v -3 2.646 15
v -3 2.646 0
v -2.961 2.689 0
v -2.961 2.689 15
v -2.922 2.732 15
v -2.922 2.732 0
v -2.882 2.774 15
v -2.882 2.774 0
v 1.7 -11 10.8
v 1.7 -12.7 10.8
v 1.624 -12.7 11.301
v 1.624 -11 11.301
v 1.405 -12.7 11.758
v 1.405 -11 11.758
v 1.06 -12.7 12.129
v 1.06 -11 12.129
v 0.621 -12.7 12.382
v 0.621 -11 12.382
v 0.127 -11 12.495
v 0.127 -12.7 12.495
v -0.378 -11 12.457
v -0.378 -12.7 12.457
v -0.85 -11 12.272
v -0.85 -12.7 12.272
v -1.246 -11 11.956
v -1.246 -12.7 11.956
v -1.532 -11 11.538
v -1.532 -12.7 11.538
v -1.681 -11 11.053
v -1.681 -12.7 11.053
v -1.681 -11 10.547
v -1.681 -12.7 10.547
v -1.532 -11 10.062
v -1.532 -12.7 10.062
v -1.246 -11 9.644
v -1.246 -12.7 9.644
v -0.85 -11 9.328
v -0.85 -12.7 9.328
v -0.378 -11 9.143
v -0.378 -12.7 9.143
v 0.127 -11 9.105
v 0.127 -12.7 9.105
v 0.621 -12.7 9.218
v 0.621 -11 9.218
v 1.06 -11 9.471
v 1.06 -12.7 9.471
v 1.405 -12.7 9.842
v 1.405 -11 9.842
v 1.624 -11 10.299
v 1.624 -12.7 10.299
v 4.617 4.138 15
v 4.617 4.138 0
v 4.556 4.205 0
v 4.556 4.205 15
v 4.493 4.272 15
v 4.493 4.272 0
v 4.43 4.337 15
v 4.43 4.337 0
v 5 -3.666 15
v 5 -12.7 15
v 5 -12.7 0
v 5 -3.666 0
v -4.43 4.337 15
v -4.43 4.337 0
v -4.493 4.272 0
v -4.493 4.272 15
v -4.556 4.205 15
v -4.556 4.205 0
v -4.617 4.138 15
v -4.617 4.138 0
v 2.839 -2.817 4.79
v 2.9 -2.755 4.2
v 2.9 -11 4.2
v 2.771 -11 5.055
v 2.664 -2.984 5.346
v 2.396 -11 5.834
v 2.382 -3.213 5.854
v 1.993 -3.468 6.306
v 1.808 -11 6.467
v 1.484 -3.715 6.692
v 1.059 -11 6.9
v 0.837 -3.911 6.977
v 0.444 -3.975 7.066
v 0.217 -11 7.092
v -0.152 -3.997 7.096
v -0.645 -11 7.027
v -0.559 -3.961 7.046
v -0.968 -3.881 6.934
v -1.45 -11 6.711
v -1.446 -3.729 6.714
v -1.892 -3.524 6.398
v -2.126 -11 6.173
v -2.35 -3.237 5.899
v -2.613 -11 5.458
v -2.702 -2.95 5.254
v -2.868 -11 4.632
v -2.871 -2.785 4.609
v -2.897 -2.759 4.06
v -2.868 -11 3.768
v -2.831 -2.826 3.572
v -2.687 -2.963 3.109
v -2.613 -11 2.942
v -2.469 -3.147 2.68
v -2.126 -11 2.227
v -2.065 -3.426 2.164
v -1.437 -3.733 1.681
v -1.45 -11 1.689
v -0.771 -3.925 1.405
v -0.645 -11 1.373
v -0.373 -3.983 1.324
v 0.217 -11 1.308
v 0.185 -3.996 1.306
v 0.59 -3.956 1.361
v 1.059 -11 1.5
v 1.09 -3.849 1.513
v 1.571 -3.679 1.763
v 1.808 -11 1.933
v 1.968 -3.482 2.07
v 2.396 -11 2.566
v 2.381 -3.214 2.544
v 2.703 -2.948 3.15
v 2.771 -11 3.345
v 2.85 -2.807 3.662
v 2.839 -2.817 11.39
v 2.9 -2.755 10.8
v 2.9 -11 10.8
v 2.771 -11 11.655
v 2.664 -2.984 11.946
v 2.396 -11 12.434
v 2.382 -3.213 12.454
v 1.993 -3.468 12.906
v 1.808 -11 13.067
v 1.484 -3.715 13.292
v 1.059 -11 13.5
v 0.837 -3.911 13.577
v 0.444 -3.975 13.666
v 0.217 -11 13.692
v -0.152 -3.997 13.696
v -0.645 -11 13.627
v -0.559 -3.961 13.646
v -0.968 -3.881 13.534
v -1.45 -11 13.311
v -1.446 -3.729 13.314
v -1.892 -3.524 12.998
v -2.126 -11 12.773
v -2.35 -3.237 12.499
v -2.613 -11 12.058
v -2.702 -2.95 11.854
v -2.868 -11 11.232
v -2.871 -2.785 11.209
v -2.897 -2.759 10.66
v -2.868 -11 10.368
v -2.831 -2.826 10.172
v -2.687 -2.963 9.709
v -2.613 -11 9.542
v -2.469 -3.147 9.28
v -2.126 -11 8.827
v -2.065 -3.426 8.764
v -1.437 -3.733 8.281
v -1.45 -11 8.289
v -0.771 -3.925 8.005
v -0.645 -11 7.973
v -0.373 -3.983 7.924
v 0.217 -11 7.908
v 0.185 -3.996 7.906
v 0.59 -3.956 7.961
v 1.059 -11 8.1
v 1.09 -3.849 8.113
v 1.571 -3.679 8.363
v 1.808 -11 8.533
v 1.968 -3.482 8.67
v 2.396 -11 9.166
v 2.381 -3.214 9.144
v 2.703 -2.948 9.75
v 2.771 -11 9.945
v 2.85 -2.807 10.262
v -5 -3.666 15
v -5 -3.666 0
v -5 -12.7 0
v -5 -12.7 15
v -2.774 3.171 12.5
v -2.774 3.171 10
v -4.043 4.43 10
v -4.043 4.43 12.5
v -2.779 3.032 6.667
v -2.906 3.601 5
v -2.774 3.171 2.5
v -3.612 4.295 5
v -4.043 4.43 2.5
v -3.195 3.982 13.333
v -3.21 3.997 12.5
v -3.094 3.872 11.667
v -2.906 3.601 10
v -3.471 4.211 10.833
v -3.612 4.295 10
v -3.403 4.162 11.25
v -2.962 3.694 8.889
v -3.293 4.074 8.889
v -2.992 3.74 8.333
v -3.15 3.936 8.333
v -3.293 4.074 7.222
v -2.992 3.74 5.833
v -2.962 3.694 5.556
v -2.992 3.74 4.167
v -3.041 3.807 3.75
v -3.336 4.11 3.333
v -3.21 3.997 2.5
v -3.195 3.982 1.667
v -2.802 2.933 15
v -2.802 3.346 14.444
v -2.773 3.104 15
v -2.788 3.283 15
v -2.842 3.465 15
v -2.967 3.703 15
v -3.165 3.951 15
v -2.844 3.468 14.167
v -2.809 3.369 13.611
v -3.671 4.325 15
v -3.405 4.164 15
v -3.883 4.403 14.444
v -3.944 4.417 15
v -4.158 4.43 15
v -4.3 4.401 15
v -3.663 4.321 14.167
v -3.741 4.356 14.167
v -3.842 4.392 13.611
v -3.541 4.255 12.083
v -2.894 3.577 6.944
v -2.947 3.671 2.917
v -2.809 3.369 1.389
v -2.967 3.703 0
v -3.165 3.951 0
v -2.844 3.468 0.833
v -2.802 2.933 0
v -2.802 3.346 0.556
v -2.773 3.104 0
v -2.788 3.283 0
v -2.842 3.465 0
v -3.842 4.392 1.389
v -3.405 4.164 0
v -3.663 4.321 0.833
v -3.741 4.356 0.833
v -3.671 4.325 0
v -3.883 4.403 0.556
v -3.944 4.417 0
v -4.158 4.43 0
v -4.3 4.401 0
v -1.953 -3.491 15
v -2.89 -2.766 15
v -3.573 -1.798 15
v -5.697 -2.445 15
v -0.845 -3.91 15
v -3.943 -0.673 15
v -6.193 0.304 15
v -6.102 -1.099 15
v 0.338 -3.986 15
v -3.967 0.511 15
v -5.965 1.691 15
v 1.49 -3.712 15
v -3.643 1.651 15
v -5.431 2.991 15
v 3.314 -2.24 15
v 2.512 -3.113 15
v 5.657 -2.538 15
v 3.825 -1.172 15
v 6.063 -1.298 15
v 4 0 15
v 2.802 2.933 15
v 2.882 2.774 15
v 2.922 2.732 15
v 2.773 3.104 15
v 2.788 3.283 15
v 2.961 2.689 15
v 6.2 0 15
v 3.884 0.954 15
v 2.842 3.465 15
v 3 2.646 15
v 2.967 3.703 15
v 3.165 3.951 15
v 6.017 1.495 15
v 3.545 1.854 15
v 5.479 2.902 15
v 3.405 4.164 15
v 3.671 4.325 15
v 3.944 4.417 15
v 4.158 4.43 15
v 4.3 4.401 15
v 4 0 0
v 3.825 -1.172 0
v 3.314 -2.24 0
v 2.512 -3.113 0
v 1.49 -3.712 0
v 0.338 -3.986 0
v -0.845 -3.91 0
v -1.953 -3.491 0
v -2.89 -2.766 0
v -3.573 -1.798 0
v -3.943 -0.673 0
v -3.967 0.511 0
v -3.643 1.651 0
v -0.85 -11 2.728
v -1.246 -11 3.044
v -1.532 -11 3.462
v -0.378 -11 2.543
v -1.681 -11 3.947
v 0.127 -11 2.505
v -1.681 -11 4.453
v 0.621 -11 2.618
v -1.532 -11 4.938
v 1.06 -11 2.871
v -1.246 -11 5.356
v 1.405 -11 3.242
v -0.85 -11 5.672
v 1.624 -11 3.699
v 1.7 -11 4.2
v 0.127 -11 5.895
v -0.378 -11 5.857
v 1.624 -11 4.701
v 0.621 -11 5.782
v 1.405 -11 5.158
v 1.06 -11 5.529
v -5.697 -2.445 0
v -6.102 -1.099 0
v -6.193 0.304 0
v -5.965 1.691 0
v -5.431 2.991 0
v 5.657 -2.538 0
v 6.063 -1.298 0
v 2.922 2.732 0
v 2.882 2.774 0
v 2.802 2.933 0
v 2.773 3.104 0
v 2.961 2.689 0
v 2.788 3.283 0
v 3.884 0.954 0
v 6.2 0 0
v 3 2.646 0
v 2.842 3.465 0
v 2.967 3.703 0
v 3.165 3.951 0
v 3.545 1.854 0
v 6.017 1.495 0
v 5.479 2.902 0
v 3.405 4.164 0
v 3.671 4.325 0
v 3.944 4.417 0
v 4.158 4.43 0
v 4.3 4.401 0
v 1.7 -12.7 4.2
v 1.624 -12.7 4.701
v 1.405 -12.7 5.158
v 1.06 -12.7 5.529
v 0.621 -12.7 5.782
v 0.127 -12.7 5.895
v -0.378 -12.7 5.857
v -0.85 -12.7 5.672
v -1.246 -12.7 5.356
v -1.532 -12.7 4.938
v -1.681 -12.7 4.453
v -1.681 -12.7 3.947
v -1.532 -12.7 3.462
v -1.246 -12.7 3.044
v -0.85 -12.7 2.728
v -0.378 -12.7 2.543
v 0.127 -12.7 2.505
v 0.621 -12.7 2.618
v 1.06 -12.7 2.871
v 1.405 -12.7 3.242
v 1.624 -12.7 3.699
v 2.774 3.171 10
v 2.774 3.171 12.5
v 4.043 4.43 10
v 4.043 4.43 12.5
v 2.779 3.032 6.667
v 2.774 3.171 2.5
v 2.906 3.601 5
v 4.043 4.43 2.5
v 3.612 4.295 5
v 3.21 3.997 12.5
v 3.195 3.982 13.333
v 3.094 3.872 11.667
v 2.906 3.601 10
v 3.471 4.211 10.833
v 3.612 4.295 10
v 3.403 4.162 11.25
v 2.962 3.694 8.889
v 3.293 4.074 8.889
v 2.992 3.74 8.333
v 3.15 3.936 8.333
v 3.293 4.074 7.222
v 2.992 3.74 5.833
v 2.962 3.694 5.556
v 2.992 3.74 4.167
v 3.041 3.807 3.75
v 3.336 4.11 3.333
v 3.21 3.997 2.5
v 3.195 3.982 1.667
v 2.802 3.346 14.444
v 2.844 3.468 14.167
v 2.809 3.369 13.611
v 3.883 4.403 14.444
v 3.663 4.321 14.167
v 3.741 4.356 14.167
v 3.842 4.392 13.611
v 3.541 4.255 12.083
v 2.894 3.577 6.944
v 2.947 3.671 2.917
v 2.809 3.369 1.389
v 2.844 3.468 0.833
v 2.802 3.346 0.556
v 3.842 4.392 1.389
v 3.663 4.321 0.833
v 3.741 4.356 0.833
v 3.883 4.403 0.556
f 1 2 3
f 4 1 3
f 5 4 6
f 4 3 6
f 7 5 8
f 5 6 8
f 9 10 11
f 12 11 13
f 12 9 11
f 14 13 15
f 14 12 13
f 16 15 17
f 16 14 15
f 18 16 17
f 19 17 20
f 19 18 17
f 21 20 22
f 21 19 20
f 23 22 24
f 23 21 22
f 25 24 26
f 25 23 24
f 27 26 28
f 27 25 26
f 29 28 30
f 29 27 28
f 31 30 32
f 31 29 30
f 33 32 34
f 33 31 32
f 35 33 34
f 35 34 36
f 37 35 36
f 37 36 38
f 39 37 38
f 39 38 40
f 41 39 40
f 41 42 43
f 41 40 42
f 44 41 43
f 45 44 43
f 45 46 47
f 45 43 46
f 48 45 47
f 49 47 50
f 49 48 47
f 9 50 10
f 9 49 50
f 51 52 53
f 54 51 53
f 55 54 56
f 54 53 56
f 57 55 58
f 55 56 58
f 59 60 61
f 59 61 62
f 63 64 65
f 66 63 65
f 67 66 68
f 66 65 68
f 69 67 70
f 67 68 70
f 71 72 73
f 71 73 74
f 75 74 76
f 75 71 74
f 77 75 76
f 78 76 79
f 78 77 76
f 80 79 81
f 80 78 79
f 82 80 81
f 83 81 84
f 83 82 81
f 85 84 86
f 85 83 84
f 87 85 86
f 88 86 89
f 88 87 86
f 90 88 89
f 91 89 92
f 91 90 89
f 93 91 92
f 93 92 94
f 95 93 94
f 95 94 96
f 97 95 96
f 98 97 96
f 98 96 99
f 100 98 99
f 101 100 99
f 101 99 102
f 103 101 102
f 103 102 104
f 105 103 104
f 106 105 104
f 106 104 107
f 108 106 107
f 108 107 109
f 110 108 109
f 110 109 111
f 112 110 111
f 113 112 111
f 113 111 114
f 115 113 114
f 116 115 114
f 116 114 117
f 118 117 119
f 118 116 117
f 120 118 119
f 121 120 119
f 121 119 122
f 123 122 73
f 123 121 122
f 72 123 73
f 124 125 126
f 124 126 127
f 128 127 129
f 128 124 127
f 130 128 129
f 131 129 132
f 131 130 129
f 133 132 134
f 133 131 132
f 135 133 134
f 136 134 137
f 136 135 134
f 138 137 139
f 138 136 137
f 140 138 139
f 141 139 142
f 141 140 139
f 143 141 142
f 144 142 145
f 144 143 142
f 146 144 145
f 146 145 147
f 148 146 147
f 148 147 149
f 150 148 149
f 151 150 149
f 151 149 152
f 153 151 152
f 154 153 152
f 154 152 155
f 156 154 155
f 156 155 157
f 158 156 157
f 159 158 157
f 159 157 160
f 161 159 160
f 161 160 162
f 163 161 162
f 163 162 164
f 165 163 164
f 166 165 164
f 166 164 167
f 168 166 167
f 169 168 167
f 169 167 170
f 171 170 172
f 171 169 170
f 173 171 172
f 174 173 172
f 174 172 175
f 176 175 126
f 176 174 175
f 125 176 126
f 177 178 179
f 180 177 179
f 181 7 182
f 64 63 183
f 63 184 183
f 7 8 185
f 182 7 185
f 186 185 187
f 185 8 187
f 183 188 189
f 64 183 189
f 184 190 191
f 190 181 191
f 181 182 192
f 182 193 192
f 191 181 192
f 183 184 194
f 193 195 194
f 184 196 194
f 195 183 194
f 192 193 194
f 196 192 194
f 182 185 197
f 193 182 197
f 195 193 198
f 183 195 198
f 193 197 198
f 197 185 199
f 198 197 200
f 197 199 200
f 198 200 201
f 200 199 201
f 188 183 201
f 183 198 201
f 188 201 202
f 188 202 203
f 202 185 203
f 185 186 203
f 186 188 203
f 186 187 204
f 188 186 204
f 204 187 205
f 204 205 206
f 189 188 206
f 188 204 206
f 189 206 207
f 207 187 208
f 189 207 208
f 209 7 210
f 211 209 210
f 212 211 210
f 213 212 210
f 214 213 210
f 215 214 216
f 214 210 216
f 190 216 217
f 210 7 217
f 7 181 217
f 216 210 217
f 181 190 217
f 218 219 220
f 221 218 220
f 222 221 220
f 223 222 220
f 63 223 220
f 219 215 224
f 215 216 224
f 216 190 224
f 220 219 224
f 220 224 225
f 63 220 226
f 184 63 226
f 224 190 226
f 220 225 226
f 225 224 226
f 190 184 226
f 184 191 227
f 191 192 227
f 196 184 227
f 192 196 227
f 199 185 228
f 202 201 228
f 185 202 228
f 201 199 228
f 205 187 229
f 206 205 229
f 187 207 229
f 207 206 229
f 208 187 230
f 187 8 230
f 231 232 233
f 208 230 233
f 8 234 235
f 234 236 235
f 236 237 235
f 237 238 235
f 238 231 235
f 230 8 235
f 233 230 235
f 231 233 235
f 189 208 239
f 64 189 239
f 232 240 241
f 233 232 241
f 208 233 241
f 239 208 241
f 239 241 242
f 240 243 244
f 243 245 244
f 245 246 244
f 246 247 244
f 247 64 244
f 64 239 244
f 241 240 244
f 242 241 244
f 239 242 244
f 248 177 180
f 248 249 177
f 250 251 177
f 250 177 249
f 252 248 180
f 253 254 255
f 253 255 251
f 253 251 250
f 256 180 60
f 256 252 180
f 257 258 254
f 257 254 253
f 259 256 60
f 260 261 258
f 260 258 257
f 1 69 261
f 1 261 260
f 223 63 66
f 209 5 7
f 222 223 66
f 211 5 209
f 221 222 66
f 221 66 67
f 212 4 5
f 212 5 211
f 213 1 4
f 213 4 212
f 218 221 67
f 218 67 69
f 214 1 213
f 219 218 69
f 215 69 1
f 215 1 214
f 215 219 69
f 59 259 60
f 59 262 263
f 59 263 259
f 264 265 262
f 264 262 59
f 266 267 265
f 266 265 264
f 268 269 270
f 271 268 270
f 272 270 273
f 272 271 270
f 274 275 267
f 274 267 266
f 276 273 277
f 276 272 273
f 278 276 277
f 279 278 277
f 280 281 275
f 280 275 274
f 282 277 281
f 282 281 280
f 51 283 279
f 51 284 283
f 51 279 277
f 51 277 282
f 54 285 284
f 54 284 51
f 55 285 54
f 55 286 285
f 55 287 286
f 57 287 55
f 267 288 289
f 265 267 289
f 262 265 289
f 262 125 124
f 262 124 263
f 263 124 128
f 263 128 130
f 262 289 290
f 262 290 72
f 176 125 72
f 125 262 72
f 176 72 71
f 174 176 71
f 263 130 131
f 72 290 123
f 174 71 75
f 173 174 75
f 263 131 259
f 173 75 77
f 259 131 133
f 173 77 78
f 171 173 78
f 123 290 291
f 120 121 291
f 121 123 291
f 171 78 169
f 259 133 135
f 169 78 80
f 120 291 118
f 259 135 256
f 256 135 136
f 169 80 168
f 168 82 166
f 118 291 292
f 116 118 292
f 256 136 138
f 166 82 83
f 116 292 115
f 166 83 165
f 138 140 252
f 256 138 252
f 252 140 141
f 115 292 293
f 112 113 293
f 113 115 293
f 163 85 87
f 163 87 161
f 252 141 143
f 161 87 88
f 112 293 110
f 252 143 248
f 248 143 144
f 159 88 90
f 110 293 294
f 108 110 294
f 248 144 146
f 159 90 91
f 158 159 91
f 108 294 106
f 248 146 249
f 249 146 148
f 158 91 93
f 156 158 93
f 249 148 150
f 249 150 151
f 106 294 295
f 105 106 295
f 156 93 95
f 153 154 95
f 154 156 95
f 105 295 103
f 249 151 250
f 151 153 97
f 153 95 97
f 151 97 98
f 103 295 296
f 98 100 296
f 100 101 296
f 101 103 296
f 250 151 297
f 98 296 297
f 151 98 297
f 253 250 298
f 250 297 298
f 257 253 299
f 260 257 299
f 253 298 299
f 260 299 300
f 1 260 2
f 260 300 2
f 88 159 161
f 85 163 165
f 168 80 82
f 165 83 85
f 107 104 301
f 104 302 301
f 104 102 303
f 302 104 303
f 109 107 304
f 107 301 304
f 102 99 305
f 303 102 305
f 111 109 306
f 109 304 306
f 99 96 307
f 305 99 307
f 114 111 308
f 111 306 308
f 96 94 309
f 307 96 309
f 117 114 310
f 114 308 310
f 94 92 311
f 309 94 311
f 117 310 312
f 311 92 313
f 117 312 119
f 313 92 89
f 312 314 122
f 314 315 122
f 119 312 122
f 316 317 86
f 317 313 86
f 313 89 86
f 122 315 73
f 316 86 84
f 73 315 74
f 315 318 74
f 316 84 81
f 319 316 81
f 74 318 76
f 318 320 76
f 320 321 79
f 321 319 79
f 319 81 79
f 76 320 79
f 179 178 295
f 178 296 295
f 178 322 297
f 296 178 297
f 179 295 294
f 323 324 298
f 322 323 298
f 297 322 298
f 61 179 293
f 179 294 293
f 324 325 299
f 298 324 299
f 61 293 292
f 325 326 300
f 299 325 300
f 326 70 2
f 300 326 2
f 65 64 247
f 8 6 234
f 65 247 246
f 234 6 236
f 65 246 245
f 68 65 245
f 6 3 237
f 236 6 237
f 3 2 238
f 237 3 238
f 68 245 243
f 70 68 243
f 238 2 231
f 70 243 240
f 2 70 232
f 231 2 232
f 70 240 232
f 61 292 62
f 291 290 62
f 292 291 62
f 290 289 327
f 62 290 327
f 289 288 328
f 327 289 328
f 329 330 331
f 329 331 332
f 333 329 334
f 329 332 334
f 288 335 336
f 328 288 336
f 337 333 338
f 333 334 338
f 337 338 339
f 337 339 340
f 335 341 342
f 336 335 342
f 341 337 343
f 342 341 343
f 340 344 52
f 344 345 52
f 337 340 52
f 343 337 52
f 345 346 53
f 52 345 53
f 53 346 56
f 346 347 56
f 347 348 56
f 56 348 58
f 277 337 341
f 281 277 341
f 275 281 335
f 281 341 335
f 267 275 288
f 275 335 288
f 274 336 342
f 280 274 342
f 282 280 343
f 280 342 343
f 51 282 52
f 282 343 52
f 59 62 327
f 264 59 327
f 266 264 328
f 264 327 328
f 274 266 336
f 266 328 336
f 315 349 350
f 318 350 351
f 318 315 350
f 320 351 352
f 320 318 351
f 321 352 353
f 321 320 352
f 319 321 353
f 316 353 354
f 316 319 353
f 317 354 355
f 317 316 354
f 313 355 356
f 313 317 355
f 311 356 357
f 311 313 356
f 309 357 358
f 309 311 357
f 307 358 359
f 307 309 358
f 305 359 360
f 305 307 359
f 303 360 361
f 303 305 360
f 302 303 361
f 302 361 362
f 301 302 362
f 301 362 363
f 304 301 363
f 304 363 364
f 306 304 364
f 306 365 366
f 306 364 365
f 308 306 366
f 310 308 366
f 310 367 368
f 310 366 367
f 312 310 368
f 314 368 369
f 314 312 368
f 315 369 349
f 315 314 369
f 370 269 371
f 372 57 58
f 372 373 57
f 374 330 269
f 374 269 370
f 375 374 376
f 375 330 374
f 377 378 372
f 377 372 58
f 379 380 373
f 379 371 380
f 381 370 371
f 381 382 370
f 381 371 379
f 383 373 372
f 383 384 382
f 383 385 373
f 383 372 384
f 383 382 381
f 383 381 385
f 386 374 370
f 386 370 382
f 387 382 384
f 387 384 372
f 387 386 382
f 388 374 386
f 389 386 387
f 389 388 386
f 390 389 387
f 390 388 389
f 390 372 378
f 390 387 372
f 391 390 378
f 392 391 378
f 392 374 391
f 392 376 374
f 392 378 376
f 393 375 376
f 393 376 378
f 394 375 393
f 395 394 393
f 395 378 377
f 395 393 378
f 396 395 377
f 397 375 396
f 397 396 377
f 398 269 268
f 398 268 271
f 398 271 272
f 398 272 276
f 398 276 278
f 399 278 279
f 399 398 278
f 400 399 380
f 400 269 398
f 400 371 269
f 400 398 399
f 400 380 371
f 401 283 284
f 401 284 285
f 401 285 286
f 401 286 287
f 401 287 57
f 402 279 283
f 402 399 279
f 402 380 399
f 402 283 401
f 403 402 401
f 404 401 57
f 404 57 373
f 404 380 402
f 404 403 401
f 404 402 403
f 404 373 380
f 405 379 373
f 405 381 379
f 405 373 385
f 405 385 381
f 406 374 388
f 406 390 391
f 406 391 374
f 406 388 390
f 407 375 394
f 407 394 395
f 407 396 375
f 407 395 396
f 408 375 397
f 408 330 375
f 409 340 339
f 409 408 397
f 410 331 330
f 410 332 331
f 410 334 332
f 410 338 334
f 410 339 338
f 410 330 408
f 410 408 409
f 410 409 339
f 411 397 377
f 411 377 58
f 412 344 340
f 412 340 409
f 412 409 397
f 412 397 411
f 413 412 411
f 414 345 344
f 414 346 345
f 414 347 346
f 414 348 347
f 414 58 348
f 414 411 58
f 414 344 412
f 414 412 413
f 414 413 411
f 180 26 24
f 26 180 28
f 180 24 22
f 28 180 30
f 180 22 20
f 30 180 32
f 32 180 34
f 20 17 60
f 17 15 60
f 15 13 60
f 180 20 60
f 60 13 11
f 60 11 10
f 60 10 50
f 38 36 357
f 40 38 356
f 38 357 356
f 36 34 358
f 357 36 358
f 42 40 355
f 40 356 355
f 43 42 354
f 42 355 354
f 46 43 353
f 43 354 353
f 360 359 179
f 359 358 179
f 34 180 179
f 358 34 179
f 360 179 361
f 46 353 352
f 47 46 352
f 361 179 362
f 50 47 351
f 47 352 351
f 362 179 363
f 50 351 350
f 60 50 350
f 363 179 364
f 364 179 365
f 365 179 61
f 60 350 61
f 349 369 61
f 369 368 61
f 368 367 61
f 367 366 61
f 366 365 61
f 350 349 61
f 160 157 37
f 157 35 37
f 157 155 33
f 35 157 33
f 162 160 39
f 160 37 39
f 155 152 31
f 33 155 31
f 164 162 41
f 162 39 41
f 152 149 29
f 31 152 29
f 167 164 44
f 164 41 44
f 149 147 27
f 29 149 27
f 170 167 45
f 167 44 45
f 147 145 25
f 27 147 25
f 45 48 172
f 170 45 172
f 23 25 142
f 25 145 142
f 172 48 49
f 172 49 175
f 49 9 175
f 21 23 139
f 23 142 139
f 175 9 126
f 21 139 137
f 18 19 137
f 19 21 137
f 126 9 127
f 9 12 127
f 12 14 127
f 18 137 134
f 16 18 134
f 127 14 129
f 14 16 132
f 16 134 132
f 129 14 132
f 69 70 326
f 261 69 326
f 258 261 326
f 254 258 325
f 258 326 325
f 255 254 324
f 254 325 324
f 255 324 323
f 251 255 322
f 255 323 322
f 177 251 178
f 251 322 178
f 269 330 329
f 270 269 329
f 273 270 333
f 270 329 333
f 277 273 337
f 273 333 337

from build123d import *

# Parameters (mm, degrees)
F1_DEPTH = 15
F2_R     = 1.7
F3_DEPTH = 25
F2_R_2   = 2.9
F4_DEPTH = 11


# Not quite as in the source:
# - a feature names something its author has since deleted; it is built from what else it names


with BuildPart() as f1:
    # F0 (on Top) → F1 (new body)
    with BuildSketch(Plane.XY):
        with BuildLine():
            ThreePointArc((3, 2.6457513111), (3.7416573868, 1.4142135624), (4, 0))
            ThreePointArc((4, 0), (-1.4142135624, -3.7416573868), (-3, 2.6457513111))
            ThreePointArc((-3, 2.6457513111), (-2.9417354436, 2.7103860574), (-2.8820786357, 2.7737380442))
            add(Edge.make_bspline(
                [(-2.8820786357, 2.7737380442), (-2.3761359585, 3.4936148761), (-3.7454309361, 4.7943850499), (-4.4301631449, 4.3374709808)],
                knots=[0.118365038, 0.118365038, 0.118365038, 0.118365038, 2.0060809504, 2.0060809504, 2.0060809504, 2.0060809504], degree=3))
            ThreePointArc((-4.4301631449, 4.3374709808), (-4.524697766, 4.2387628061), (-4.6170335889, 4.1379947848))
            ThreePointArc((-4.6170335889, 4.1379947848), (-6.1925482399, 0.3038853354), (-5, -3.666060556))
            ThreePointArc((-5, -3.666060556), (0, -6.2), (5, -3.666060556))
            ThreePointArc((5, -3.666060556), (5.8923679451, -1.9287301522), (6.2, 0))
            ThreePointArc((6.2, 0), (5.7907516028, 2.2152191481), (4.6170335889, 4.1379947848))
            ThreePointArc((4.6170335889, 4.1379947848), (4.524697766, 4.2387628061), (4.4301631449, 4.3374709808))
            add(Edge.make_bspline(
                [(2.8820786357, 2.7737380442), (2.3761359585, 3.4936148761), (3.7454309361, 4.7943850499), (4.4301631449, 4.3374709808)],
                knots=[0.118365038, 0.118365038, 0.118365038, 0.118365038, 2.0060809504, 2.0060809504, 2.0060809504, 2.0060809504], degree=3))
            ThreePointArc((2.8820786357, 2.7737380442), (2.9417354436, 2.7103860574), (3, 2.6457513111))
        make_face()
        with BuildLine():
            ThreePointArc((5, -3.666060556), (0, -6.2), (-5, -3.666060556))
            Line((-5, -3.666060556), (-5, -12.7))
            Line((-5, -12.7), (0, -12.7))
            Line((0, -12.7), (5, -12.7))
            Line((5, -12.7), (5, -3.666060556))
        make_face()
    extrude(amount=F1_DEPTH)

    # F2 (on Front) → F3 (cut)
    with BuildSketch(Plane.XZ):
        with Locations((0, 10.8)):
            Circle(F2_R)
        with Locations((3.5e-09, 4.2)):
            Circle(F2_R)
    extrude(amount=F3_DEPTH, mode=Mode.SUBTRACT)

    # F2 (on Front) → F4 (cut)
    with BuildSketch(Plane.XZ):
        with Locations((0, 10.8)):
            Circle(F2_R_2)
        with Locations((0, 10.8)):
            Circle(F2_R, mode=Mode.SUBTRACT)
        with Locations((3.5e-09, 4.2)):
            Circle(F2_R_2)
        with Locations((3.5e-09, 4.2)):
            Circle(F2_R, mode=Mode.SUBTRACT)
    extrude(amount=F4_DEPTH, mode=Mode.SUBTRACT)


solid = f1.part
